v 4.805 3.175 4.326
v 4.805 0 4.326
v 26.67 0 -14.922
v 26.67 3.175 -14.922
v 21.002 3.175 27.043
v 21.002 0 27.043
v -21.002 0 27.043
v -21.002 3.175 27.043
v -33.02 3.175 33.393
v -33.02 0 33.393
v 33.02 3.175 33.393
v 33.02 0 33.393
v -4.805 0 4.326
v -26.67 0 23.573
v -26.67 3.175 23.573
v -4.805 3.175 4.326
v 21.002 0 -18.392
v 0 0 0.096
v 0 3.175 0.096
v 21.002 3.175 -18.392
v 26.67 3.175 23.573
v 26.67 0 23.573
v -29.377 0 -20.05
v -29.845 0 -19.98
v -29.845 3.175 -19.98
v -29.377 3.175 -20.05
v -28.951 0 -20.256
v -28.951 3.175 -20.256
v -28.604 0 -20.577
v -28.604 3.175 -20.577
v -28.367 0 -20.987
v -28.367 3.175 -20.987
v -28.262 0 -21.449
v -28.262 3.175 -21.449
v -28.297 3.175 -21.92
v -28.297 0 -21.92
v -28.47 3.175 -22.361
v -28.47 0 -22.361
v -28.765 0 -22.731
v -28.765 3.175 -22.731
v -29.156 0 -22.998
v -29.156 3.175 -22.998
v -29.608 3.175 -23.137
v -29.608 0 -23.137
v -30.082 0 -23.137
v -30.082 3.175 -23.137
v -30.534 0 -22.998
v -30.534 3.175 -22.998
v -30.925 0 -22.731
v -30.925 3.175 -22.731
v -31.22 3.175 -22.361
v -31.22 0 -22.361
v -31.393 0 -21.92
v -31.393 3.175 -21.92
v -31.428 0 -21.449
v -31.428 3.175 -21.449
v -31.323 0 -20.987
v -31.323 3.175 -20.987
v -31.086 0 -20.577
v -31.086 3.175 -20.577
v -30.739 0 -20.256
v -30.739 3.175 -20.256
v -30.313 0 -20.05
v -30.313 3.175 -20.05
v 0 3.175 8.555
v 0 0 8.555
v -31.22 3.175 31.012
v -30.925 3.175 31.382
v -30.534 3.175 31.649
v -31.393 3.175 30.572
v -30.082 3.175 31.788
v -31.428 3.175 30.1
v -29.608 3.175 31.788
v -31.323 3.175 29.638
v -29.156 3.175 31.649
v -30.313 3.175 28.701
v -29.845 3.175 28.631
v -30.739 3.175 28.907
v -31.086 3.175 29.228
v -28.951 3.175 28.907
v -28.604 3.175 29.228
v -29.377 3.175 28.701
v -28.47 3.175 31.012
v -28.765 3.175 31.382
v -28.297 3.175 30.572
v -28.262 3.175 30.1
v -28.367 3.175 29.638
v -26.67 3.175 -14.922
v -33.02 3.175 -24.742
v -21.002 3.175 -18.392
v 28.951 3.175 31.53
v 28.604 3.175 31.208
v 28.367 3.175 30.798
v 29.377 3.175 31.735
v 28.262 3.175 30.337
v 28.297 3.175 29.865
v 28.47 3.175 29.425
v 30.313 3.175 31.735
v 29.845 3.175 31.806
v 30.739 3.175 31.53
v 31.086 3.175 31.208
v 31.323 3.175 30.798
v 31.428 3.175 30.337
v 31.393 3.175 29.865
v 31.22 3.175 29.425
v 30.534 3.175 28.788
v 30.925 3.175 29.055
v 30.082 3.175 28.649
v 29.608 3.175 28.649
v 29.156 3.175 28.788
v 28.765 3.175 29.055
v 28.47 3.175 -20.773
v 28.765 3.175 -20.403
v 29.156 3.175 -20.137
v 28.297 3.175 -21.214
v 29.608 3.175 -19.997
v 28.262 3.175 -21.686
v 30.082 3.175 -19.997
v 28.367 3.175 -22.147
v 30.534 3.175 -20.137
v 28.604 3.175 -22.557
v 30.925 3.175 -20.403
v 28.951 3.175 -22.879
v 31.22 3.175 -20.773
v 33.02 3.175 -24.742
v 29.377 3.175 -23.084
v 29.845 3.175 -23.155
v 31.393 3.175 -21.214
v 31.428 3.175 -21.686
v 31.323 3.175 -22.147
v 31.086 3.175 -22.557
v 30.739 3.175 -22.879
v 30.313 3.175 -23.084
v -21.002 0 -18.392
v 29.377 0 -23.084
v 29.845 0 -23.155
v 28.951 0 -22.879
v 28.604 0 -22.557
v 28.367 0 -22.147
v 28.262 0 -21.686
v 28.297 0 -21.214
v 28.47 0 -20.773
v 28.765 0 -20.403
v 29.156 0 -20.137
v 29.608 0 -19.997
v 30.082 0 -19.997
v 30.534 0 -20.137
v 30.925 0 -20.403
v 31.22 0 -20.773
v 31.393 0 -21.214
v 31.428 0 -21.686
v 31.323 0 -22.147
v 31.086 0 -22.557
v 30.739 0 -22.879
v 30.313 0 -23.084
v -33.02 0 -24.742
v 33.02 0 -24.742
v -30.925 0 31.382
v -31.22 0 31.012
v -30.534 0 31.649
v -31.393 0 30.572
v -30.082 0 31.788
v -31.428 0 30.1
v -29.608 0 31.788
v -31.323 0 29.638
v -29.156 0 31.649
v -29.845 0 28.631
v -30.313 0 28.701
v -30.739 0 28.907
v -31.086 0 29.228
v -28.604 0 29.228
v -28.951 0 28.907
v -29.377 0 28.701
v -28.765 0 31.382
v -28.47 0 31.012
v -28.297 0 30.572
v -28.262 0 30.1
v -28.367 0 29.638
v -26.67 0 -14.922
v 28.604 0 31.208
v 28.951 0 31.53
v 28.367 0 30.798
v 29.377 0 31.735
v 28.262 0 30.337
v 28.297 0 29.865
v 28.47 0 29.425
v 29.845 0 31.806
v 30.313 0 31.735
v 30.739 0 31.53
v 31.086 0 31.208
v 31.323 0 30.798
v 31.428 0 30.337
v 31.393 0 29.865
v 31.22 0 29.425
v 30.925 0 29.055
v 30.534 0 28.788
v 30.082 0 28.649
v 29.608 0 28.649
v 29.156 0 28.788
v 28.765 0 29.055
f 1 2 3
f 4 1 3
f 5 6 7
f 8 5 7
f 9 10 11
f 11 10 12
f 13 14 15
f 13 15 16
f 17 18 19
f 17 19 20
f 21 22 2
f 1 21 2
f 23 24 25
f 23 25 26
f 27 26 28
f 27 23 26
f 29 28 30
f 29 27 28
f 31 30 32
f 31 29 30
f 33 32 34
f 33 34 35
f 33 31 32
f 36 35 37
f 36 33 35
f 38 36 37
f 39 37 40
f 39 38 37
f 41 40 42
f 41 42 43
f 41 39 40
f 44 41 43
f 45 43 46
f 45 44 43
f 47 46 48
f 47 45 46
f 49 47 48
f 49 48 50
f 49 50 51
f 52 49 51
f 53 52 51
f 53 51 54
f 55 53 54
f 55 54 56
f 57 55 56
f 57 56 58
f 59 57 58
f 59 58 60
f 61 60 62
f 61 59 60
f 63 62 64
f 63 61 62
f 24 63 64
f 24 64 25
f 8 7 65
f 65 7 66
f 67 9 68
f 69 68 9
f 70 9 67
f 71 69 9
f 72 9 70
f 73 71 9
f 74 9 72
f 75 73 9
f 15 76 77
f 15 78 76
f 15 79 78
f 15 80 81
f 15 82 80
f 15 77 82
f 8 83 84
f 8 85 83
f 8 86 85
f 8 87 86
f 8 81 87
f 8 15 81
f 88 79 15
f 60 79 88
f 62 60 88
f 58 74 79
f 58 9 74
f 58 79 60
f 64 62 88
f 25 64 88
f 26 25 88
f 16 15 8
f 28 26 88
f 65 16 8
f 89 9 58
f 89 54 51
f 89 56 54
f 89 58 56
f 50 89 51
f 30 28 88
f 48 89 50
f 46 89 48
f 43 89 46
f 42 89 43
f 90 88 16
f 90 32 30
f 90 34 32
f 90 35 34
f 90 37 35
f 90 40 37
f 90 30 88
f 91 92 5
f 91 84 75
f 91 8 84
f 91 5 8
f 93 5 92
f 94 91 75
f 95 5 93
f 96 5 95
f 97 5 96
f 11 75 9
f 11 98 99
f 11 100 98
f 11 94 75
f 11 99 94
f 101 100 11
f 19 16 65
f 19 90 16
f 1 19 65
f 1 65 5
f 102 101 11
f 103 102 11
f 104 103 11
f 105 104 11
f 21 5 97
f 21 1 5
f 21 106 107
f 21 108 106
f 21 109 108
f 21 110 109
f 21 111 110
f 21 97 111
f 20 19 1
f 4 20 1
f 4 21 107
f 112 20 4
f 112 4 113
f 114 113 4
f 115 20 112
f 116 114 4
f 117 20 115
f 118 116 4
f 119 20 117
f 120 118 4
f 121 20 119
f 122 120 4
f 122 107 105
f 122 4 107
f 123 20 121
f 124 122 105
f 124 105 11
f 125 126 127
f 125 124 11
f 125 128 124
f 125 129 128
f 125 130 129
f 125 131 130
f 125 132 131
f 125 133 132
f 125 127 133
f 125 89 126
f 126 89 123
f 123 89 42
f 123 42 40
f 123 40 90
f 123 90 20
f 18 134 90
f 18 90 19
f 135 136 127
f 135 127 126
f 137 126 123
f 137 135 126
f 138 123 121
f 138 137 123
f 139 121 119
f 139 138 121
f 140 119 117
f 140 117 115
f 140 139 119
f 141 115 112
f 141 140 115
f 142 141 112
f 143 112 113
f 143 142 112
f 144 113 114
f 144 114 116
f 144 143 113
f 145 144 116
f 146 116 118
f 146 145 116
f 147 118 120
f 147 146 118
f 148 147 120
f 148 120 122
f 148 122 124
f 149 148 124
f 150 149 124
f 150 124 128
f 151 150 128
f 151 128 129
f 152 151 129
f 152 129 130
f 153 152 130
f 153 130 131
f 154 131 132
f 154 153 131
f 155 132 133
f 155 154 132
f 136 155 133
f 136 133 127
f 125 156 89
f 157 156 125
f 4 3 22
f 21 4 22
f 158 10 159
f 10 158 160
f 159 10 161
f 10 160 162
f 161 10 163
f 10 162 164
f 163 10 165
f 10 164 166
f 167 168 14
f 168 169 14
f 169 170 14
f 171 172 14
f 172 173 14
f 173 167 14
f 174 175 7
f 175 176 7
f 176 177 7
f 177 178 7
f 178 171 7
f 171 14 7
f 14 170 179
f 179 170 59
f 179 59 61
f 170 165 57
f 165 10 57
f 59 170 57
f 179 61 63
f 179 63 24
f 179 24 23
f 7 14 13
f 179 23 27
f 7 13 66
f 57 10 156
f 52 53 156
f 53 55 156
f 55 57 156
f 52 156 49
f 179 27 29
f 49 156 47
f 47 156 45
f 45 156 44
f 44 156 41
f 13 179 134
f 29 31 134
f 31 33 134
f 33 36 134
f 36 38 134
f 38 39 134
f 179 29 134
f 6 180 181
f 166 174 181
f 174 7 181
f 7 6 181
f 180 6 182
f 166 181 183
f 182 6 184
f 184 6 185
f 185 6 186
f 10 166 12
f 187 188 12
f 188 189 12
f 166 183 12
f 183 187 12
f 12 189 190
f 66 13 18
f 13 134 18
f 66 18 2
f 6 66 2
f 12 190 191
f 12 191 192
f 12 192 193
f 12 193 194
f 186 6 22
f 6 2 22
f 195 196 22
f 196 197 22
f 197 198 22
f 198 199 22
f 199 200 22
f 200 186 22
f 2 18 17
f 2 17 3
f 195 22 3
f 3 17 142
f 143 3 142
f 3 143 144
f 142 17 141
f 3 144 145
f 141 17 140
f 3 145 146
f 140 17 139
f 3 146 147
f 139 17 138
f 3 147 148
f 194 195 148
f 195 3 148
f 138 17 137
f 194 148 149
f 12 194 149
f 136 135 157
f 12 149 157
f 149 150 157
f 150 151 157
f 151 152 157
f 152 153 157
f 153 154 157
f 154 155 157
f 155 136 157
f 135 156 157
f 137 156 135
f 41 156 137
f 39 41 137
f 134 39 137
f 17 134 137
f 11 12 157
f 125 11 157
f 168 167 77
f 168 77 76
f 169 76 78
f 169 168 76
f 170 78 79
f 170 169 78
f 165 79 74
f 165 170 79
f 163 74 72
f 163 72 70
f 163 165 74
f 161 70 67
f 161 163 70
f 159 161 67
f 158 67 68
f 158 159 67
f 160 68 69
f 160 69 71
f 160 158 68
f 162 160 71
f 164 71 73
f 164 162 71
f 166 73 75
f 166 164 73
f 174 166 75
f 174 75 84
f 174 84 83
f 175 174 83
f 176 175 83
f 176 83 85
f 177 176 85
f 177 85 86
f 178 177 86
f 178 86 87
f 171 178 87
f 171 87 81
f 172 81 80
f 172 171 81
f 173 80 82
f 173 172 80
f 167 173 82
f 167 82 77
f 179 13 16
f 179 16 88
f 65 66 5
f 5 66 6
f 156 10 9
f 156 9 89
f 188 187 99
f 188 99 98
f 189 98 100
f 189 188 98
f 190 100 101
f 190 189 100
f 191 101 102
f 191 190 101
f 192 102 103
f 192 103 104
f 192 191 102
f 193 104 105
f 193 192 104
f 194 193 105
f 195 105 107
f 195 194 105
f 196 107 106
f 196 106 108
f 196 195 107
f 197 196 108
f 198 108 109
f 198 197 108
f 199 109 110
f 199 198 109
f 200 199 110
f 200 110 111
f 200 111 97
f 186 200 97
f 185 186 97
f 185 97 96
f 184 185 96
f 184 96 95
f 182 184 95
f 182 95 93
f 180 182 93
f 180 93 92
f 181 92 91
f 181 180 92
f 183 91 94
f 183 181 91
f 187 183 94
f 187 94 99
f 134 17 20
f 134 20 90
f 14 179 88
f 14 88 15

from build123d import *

# Parameters (mm, degrees)
SKETCH1_W           = 66.04
SKETCH1_H           = 58.135485311
SKETCH1_R           = 1.5875
BOSS_EXTRUDE1_DEPTH = 3.175


with BuildPart() as part:
    # Sketch1 → Boss-Extrude1 (new body)
    with BuildSketch(Plane(origin=(0, 0, 0), x_dir=(1, 0, 0), z_dir=(0, 1, 0))):
        with Locations((0, -4.325528995)):
            Rectangle(SKETCH1_W, SKETCH1_H)
        with Locations(Location((29.845, 21.56721366, 0), (0, 0, 90))):
            Circle(SKETCH1_R, mode=Mode.SUBTRACT)
        with Locations(Location((29.845, -30.218271651, 0), (0, 0, 270))):
            Circle(SKETCH1_R, mode=Mode.SUBTRACT)
        with Locations(Location((-29.845, -30.218271651, 0), (0, 0, 90))):
            Circle(SKETCH1_R, mode=Mode.SUBTRACT)
        with Locations(Location((-29.845, 21.56721366, 0), (0, 0, 270))):
            Circle(SKETCH1_R, mode=Mode.SUBTRACT)
        Polygon((-26.67, -23.573367042), (-4.805088789, -4.325528996), (-26.67, 14.92230905), align=None, mode=Mode.SUBTRACT)
        Polygon((-21.00151998, 18.39221366), (0, -0.095574897), (21.00151998, 18.39221366), align=None, mode=Mode.SUBTRACT)
        Polygon((0, -8.555483095), (21.00151998, -27.043271651), (-21.00151998, -27.043271651), align=None, mode=Mode.SUBTRACT)
        Polygon((4.805088789, -4.325528996), (26.67, 14.92230905), (26.67, -23.573367042), align=None, mode=Mode.SUBTRACT)
    extrude(amount=BOSS_EXTRUDE1_DEPTH)


solid = part.part
